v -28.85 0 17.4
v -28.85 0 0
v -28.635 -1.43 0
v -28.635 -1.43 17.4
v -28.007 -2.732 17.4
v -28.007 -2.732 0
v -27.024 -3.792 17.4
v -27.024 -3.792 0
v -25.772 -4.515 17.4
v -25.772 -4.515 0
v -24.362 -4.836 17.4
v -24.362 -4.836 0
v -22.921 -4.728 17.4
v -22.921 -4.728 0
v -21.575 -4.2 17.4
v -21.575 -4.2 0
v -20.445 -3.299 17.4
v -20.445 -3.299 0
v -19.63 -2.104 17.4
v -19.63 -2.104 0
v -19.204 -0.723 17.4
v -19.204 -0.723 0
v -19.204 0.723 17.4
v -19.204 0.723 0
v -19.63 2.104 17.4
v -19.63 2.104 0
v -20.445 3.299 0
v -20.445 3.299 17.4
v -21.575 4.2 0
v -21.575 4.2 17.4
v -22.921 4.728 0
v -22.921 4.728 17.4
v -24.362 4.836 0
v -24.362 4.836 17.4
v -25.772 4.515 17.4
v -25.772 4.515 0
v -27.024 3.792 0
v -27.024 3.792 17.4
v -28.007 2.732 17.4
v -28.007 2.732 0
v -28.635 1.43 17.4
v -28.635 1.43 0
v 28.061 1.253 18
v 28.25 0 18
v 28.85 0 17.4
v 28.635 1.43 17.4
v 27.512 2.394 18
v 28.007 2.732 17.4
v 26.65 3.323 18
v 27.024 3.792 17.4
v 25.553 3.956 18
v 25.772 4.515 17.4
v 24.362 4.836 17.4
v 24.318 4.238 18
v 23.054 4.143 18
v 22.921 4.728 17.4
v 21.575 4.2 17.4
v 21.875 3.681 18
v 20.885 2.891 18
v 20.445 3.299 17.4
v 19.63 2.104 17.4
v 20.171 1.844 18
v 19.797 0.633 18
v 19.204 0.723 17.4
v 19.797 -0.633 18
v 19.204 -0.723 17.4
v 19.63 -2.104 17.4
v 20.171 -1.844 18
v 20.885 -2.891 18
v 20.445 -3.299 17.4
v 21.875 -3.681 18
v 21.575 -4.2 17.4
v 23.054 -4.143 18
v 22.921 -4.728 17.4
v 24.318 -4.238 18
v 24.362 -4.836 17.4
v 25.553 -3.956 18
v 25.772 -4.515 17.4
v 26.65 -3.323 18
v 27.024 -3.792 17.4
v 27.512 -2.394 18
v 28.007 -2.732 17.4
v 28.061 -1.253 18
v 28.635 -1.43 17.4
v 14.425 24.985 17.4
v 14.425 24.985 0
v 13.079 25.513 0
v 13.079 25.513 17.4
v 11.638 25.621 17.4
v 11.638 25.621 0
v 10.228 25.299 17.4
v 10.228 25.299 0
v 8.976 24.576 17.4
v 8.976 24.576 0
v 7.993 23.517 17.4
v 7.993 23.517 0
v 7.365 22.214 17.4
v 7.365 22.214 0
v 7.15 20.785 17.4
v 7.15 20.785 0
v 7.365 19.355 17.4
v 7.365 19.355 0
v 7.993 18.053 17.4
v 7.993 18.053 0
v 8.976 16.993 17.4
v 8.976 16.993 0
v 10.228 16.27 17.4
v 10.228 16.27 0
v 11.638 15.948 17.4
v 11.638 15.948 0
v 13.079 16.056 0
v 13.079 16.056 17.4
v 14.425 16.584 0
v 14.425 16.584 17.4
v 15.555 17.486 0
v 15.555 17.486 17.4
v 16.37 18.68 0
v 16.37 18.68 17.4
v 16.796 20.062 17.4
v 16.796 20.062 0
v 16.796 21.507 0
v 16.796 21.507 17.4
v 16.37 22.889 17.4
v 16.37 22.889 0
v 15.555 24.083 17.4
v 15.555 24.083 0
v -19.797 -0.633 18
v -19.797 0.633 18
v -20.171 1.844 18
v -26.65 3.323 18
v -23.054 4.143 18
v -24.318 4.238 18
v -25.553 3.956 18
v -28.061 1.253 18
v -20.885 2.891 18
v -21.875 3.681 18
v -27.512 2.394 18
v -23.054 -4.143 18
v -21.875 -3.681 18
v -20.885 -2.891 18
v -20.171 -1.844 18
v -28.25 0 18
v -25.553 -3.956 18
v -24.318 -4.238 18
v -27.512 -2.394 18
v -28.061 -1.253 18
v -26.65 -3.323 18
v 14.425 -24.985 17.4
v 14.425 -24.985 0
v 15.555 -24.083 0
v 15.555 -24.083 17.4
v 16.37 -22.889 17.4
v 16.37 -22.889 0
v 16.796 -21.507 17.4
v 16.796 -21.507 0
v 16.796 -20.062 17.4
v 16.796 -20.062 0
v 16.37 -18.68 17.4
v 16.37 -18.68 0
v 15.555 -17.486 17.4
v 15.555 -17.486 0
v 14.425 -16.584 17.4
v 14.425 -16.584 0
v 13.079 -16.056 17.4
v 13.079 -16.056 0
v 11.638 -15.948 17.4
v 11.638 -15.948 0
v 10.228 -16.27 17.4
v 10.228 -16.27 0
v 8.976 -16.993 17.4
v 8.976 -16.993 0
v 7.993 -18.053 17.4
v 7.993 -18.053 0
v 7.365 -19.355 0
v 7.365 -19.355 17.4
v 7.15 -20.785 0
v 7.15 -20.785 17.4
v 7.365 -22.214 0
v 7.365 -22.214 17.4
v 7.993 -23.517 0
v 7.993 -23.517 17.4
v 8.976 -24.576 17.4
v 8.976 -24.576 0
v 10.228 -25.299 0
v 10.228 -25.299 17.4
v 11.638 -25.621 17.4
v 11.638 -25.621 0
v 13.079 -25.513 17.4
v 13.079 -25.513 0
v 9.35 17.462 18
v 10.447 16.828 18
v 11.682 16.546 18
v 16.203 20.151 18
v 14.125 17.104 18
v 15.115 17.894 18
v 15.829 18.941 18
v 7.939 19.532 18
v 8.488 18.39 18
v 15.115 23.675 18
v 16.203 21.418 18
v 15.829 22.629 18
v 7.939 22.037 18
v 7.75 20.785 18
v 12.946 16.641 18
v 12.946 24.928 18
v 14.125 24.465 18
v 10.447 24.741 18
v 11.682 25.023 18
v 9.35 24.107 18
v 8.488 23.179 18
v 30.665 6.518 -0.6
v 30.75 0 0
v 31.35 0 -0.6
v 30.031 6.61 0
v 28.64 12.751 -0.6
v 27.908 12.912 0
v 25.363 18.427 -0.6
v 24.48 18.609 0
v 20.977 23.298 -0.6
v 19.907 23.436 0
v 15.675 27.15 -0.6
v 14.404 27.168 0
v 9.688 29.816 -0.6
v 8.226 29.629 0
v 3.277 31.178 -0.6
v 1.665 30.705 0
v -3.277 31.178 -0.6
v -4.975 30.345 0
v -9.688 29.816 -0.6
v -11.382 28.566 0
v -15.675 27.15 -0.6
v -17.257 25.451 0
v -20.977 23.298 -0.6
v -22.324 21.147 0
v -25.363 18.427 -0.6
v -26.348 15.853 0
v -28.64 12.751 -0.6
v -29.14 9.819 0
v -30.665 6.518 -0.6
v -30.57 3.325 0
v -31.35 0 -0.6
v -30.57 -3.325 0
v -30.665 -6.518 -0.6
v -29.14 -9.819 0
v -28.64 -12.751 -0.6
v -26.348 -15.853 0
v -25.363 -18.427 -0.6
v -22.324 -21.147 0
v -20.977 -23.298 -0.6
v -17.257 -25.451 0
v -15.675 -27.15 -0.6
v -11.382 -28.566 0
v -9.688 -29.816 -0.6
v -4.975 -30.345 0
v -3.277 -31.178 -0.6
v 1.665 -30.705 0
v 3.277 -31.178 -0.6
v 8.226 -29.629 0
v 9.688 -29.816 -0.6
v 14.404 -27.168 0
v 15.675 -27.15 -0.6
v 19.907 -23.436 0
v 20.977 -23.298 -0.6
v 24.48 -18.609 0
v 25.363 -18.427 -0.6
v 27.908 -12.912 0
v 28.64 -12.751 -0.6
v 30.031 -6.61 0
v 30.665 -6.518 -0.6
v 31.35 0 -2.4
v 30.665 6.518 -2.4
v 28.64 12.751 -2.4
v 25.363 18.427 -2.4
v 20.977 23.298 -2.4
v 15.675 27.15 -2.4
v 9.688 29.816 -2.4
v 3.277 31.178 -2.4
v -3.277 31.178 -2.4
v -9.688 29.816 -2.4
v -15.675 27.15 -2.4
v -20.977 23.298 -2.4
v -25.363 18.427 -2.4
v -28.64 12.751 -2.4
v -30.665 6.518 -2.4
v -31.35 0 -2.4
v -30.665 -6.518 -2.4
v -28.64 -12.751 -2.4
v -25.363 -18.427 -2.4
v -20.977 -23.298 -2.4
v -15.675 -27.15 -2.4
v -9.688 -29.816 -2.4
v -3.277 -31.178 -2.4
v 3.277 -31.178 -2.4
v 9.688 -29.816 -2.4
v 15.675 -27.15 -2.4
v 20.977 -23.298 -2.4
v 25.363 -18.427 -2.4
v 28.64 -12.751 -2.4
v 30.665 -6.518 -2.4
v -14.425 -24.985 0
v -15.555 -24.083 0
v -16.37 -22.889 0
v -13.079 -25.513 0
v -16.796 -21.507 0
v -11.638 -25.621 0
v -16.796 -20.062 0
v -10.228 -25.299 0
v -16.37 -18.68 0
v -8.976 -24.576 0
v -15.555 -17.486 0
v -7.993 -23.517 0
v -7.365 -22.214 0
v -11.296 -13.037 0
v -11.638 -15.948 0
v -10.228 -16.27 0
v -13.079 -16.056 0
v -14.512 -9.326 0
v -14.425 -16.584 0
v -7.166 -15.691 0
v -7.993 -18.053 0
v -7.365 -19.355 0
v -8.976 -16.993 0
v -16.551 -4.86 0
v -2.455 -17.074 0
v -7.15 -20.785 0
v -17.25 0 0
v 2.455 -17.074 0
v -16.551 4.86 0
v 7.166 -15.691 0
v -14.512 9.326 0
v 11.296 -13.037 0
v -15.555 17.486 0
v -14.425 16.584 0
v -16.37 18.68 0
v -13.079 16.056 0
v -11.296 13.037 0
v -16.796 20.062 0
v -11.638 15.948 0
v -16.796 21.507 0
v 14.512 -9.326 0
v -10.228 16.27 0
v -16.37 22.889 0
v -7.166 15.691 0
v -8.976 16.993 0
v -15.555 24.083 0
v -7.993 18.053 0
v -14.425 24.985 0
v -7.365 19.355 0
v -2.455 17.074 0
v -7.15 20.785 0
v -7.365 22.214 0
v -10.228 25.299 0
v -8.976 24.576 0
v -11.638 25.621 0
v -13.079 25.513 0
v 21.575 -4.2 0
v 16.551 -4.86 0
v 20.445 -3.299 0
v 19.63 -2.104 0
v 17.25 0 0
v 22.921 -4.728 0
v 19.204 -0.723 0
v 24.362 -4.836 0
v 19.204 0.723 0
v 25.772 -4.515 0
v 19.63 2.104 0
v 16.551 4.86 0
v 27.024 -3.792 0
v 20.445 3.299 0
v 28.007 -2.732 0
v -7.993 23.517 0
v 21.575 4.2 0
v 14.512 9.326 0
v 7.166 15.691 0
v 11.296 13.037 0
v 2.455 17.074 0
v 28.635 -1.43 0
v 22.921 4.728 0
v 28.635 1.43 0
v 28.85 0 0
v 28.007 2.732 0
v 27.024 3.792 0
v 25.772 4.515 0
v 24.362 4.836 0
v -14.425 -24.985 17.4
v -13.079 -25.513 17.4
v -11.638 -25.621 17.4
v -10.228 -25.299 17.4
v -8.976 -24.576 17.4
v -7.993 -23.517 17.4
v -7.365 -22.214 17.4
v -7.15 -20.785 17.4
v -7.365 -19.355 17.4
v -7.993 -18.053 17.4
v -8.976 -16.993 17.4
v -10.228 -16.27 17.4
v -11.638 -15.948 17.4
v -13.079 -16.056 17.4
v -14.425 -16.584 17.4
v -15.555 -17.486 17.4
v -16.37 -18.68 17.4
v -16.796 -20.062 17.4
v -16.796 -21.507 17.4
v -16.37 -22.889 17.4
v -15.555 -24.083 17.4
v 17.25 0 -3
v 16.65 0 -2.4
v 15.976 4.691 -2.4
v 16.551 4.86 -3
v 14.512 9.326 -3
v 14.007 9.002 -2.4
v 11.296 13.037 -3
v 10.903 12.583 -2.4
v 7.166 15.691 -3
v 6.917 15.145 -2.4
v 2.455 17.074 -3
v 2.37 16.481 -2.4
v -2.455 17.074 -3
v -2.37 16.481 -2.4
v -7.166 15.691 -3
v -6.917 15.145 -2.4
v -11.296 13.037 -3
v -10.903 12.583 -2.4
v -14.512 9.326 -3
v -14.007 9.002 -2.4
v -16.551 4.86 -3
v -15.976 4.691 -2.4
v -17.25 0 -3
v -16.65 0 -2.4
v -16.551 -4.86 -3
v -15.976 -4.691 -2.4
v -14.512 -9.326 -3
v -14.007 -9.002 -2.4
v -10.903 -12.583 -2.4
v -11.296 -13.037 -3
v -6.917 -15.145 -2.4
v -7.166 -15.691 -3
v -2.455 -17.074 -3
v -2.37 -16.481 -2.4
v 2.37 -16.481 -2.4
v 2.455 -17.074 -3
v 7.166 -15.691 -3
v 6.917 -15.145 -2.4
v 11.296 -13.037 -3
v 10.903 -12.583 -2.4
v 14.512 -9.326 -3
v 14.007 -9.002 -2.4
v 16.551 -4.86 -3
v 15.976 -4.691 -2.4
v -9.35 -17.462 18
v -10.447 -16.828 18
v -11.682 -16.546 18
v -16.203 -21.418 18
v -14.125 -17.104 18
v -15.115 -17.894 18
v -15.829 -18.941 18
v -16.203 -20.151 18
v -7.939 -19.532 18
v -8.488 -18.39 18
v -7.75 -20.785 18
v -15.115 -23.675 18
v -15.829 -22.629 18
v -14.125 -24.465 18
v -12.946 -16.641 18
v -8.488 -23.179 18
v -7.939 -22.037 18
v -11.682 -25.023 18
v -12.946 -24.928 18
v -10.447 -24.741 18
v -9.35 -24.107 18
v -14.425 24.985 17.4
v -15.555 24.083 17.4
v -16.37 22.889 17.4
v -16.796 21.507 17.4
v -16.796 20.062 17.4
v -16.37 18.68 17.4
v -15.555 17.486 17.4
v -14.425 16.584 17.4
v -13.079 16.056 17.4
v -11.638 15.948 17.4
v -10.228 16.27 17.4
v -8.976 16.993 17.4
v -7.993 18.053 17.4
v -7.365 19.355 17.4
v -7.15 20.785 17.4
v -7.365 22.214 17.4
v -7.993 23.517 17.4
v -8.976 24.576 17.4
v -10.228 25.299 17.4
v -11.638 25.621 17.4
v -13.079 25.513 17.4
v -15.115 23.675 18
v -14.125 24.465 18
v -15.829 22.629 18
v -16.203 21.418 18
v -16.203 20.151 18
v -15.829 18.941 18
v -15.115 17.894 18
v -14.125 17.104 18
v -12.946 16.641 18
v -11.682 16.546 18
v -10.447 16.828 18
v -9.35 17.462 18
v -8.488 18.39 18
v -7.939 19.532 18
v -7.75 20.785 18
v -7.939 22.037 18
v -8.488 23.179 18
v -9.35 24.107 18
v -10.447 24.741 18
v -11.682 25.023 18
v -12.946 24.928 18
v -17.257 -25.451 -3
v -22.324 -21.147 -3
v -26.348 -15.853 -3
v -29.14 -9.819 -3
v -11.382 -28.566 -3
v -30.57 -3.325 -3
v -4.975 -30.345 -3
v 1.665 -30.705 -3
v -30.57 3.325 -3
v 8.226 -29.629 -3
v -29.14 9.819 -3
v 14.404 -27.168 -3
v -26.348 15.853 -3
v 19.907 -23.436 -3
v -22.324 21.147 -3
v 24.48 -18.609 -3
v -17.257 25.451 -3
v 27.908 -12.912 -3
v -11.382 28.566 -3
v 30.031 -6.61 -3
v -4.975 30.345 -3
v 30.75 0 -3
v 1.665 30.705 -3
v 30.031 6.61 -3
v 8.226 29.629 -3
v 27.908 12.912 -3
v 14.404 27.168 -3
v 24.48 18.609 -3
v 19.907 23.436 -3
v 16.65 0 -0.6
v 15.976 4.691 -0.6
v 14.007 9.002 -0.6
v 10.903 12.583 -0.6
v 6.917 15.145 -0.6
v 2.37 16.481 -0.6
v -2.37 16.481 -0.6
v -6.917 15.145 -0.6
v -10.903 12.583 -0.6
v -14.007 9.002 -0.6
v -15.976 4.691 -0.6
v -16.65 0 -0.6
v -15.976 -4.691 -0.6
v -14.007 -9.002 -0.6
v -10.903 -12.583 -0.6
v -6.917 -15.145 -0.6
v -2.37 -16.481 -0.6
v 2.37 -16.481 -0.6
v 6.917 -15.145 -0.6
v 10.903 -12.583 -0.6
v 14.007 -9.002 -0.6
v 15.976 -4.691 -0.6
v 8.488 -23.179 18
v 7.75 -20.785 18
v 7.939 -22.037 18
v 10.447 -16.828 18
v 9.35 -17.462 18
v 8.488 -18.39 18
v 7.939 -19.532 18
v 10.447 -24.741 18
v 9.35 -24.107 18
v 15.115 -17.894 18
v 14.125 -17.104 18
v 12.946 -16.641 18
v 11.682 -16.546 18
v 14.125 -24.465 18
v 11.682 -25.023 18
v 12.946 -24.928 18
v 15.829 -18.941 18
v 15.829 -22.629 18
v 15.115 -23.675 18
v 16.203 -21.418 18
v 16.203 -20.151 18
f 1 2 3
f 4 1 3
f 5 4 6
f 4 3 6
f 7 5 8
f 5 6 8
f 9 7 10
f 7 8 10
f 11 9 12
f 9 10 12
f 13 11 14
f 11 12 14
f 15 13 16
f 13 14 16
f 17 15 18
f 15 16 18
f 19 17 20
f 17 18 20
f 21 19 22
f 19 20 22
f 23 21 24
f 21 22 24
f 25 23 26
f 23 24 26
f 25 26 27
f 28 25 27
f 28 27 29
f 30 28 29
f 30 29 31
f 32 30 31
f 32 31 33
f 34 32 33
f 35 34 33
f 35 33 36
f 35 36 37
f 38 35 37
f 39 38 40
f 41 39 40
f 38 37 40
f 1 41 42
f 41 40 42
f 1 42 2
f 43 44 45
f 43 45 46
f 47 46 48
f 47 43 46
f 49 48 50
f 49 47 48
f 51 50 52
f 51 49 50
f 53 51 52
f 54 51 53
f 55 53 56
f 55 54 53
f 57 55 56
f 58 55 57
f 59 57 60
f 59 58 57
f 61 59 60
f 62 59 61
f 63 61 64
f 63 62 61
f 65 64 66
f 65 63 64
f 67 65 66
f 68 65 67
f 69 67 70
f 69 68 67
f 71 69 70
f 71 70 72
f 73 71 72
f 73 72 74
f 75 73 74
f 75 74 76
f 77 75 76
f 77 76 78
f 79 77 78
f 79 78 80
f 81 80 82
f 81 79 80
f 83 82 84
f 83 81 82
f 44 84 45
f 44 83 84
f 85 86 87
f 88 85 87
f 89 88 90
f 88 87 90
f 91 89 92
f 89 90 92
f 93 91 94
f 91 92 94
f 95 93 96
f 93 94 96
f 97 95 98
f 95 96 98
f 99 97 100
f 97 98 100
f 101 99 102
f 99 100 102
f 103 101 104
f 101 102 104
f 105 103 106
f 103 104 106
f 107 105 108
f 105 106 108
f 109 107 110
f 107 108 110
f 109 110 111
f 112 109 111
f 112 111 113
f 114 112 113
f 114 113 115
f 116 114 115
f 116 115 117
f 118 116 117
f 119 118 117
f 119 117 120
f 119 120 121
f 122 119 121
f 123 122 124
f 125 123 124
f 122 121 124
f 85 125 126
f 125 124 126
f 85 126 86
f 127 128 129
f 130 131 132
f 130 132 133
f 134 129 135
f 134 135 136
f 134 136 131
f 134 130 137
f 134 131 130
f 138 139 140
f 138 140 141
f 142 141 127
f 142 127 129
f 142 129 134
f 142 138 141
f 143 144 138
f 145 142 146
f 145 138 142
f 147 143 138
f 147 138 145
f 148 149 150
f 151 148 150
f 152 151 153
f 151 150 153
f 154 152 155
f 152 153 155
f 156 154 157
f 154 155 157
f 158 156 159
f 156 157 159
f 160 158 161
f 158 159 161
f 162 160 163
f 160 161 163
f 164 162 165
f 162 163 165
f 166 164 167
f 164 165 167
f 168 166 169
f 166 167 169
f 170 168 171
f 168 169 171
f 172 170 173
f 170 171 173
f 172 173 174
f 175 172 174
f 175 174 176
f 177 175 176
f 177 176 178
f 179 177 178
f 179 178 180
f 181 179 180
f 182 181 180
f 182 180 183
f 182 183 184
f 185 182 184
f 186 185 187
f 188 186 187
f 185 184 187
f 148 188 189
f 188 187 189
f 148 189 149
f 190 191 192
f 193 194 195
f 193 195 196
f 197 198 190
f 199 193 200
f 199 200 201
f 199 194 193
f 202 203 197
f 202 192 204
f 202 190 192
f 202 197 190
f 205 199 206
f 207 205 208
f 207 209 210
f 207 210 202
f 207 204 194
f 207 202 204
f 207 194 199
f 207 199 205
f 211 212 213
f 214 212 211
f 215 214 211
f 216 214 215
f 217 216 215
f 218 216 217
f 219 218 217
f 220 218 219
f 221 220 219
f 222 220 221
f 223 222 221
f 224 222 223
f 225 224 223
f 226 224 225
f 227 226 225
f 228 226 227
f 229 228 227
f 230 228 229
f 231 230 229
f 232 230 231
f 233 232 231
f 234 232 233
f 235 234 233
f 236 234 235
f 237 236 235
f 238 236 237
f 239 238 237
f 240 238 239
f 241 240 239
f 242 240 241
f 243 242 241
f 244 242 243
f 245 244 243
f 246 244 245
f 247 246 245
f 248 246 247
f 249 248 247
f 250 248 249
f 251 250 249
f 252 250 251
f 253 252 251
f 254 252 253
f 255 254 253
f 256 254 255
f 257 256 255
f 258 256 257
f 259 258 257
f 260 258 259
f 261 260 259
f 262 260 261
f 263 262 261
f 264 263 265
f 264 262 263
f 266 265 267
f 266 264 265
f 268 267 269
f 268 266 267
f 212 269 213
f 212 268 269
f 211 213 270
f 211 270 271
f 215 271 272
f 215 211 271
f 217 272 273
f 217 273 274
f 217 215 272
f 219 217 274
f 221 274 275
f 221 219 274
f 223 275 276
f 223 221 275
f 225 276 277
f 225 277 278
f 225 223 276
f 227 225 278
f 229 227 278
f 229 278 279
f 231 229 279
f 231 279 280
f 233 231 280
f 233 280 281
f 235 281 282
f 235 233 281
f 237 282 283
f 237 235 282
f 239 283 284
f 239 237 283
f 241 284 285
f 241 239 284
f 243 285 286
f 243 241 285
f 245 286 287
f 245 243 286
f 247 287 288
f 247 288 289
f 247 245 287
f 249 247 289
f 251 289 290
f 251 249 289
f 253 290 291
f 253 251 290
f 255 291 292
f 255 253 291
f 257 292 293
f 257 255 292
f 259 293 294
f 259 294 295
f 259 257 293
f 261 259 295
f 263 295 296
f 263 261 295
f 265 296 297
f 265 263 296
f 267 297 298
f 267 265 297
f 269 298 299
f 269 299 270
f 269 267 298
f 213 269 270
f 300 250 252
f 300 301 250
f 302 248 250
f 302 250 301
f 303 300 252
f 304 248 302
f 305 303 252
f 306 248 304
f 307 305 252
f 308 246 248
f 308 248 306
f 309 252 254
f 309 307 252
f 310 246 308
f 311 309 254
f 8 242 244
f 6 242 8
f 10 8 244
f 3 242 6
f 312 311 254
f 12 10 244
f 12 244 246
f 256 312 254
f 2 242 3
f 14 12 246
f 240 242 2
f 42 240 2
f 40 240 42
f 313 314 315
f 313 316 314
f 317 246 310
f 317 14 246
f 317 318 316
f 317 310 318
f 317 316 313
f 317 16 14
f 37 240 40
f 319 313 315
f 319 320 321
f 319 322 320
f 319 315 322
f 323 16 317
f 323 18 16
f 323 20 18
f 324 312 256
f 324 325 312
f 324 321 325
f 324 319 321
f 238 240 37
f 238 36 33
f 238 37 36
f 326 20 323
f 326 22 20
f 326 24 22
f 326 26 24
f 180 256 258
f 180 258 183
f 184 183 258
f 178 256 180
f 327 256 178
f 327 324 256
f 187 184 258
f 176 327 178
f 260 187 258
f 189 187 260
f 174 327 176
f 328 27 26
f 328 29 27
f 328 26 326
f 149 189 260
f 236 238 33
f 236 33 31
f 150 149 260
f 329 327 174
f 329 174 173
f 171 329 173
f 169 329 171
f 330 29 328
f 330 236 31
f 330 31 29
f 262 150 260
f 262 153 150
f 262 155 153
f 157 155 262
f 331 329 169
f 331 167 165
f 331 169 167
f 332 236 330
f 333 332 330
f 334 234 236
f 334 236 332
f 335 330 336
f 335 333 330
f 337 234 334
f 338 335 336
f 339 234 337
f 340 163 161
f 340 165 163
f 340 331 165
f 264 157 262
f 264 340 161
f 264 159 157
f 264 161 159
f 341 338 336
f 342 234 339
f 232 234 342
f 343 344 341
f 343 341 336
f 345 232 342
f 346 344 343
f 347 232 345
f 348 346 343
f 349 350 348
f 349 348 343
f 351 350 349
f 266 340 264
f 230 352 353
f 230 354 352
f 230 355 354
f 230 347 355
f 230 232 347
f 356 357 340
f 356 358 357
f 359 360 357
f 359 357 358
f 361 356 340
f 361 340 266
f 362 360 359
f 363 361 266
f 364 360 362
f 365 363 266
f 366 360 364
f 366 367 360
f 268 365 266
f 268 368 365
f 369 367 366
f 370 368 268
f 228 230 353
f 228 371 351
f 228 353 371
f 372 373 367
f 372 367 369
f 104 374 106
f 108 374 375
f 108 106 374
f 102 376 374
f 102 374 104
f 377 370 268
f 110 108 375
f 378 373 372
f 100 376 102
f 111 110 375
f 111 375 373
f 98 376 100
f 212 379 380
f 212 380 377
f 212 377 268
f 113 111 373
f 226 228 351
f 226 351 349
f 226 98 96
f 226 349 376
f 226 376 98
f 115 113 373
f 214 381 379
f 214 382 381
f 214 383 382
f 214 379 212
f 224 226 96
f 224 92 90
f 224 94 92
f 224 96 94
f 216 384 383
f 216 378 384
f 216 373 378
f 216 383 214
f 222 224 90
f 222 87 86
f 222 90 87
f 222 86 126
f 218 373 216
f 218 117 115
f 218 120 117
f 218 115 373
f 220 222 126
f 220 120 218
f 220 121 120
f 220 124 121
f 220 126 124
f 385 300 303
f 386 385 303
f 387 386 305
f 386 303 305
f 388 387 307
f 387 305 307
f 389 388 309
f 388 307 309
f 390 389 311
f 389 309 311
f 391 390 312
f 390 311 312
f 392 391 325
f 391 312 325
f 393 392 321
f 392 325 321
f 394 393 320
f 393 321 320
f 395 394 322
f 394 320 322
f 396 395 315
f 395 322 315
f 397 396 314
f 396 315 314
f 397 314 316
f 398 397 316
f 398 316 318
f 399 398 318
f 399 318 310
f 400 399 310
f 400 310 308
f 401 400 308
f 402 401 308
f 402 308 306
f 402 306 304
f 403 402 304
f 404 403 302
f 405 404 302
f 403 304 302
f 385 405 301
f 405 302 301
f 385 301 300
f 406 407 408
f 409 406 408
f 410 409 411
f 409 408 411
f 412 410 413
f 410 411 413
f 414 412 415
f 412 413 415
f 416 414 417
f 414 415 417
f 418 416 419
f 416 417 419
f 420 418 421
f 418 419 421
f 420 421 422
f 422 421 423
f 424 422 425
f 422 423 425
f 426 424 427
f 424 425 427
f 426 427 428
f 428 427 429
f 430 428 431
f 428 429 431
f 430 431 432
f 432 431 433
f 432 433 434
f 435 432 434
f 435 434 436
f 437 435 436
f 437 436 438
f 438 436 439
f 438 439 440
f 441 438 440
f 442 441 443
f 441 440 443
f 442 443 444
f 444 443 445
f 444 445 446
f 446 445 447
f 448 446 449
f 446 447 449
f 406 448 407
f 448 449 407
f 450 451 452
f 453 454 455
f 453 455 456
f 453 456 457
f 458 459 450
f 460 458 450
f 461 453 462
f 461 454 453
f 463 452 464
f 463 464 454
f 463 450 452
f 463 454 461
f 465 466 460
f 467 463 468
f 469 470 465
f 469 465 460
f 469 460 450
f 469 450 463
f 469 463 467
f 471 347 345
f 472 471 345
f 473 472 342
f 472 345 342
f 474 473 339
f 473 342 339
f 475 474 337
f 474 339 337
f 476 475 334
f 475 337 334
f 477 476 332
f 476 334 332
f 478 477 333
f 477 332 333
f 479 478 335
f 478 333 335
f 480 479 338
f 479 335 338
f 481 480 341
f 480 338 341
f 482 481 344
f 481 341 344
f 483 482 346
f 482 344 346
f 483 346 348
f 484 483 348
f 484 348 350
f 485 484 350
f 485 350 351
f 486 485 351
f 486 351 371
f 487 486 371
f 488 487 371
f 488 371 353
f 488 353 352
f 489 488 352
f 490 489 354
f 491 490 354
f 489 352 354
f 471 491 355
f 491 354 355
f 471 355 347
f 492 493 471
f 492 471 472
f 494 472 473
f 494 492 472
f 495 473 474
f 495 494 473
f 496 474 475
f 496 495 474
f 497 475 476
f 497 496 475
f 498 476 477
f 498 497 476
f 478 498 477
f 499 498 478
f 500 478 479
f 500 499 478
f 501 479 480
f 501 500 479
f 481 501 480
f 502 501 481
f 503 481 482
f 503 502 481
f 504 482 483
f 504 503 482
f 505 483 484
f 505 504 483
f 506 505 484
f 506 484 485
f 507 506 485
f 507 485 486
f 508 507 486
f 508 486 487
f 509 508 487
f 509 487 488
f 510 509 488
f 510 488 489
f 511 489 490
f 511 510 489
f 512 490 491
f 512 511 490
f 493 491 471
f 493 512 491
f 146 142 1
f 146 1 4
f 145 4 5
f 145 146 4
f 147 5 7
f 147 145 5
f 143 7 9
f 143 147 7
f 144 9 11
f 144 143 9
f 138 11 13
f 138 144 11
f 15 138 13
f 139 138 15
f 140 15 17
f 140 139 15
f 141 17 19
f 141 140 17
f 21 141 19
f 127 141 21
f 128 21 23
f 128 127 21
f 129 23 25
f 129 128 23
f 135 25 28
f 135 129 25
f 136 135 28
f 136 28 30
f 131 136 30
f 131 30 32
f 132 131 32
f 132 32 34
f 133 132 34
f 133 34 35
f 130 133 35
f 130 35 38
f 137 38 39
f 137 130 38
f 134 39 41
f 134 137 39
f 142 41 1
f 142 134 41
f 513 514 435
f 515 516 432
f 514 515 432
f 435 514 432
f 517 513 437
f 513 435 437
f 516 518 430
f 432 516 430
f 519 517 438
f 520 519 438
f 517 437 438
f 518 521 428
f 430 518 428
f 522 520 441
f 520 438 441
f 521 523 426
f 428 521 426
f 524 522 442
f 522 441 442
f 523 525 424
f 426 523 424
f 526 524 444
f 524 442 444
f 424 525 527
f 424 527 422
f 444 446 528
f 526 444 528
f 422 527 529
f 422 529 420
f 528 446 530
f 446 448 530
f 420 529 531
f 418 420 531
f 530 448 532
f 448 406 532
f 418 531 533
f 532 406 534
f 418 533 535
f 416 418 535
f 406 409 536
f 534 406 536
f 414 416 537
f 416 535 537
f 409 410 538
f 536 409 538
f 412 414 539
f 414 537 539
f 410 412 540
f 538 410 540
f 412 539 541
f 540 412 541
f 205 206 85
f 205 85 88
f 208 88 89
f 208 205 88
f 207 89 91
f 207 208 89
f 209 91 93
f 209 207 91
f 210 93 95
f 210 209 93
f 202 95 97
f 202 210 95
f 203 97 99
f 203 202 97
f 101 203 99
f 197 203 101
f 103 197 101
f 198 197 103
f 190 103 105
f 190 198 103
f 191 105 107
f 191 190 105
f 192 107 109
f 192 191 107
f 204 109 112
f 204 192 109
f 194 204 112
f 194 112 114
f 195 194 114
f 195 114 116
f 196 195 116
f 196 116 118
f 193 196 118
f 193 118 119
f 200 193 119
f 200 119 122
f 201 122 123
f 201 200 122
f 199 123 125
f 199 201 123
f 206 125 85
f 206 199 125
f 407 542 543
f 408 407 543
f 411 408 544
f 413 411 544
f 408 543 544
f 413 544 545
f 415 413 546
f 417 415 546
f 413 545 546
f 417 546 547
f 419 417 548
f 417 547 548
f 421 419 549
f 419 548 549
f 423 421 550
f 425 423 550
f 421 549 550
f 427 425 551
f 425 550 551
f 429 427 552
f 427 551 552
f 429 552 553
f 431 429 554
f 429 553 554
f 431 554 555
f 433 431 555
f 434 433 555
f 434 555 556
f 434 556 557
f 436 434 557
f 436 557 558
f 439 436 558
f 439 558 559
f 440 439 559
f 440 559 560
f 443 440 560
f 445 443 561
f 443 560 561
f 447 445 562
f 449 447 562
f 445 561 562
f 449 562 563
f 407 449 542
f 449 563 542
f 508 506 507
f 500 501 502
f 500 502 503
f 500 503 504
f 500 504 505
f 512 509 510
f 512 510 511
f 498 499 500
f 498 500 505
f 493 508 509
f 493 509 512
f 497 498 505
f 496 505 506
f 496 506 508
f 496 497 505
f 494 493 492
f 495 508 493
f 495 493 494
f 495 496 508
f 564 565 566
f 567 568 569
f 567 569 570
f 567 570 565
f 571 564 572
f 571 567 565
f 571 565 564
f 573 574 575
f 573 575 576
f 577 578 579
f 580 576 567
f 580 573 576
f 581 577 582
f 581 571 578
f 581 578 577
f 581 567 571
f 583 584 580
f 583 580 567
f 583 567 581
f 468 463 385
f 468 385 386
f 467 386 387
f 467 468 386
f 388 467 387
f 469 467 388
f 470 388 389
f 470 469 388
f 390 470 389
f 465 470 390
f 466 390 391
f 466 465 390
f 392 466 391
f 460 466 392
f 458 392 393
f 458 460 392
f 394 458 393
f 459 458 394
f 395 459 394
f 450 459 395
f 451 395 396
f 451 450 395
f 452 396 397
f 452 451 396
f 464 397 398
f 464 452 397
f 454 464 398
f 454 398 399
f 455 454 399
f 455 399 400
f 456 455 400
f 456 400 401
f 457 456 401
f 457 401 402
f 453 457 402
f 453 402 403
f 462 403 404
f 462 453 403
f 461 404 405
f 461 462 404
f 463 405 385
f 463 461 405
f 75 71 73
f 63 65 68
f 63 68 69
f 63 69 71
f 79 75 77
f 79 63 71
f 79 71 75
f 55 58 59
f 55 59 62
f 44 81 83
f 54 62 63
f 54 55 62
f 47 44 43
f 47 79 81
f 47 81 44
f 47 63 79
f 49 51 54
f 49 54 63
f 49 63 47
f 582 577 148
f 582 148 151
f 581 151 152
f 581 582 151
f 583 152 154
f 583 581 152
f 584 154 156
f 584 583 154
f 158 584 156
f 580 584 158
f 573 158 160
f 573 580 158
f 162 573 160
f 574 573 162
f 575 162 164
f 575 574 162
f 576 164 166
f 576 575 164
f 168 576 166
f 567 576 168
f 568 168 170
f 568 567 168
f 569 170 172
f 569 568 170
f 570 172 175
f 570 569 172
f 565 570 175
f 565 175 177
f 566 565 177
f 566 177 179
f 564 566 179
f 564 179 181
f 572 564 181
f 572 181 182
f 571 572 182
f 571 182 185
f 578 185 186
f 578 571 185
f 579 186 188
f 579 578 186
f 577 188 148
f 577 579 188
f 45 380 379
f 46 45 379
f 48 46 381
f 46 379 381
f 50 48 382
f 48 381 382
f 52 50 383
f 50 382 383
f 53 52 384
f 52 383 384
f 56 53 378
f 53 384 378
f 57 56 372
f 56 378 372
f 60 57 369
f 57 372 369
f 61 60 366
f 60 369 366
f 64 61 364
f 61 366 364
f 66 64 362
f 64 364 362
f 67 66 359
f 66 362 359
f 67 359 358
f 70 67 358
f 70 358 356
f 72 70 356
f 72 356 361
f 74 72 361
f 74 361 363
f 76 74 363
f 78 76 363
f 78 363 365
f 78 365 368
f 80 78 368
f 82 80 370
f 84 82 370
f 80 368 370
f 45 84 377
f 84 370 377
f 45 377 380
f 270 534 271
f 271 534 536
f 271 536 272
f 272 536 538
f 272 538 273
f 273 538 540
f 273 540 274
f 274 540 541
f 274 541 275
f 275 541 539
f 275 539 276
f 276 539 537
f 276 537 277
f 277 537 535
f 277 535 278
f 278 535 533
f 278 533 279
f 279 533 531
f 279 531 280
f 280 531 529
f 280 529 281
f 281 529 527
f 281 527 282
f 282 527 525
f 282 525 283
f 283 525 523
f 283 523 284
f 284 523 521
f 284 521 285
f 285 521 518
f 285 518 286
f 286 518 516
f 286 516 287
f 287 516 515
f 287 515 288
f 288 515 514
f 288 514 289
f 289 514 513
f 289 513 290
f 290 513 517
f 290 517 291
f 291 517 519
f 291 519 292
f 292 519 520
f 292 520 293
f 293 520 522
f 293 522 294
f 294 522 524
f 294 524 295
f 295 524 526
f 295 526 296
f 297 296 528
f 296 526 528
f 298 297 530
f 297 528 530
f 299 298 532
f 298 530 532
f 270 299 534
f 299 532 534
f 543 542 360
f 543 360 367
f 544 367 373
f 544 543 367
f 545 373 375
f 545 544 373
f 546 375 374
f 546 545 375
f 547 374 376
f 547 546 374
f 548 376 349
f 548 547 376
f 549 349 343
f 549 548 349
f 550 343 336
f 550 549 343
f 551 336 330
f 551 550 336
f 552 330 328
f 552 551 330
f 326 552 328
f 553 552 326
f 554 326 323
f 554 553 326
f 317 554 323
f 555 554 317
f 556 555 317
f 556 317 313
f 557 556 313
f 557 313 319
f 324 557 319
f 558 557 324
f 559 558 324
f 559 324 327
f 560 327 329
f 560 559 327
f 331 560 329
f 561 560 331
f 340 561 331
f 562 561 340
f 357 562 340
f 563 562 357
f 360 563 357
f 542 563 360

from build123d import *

# Parameters (mm, degrees)
SKETCH1_R           = 31.35
SKETCH1_R_2         = 16.65
BOSS_EXTRUDE1_DEPTH = 3
SKETCH2_R           = 4.85
BOSS_EXTRUDE2_DEPTH = 18
CIRPATTERN1_COUNT   = 6
CHAMFER1_SIZE       = 0.6


with BuildPart() as part:
    # Sketch1 → Boss-Extrude1 (new body)
    with BuildSketch(Plane.XY):
        Circle(SKETCH1_R)
        Circle(SKETCH1_R_2, mode=Mode.SUBTRACT)
    extrude(amount=-BOSS_EXTRUDE1_DEPTH)

    # Sketch2 → Boss-Extrude2 (add)
    with BuildSketch(Plane.XY):
        with Locations((24, 0)):
            Circle(SKETCH2_R)
    boss_extrude2 = extrude(amount=BOSS_EXTRUDE2_DEPTH)

    # CirPattern1: Boss-Extrude2 ×6 about axis
    cirpattern1_axis = Axis((0, 0, 0), (0, 0, 1))
    for i in range(1, CIRPATTERN1_COUNT):
        add(boss_extrude2.rotate(cirpattern1_axis, i * 360 / CIRPATTERN1_COUNT))

    # Chamfer1
    chamfer1_edges = [part.edges().sort_by_distance(p)[0] for p in [
        (19.15, 0, 18),
        (9.575, -16.584386482, 18),
        (-9.575, -16.584386482, 18),
        (-31.35, 0, 0),
        (-19.15, 0, 18),
        (-9.575, 16.584386482, 18),
        (9.575, 16.584386482, 18),
        (-31.35, 0, -3),
        (-16.65, 0, -3),
        (-16.65, 0, 0),
    ]]
    chamfer(chamfer1_edges, length=CHAMFER1_SIZE)


solid = part.part
